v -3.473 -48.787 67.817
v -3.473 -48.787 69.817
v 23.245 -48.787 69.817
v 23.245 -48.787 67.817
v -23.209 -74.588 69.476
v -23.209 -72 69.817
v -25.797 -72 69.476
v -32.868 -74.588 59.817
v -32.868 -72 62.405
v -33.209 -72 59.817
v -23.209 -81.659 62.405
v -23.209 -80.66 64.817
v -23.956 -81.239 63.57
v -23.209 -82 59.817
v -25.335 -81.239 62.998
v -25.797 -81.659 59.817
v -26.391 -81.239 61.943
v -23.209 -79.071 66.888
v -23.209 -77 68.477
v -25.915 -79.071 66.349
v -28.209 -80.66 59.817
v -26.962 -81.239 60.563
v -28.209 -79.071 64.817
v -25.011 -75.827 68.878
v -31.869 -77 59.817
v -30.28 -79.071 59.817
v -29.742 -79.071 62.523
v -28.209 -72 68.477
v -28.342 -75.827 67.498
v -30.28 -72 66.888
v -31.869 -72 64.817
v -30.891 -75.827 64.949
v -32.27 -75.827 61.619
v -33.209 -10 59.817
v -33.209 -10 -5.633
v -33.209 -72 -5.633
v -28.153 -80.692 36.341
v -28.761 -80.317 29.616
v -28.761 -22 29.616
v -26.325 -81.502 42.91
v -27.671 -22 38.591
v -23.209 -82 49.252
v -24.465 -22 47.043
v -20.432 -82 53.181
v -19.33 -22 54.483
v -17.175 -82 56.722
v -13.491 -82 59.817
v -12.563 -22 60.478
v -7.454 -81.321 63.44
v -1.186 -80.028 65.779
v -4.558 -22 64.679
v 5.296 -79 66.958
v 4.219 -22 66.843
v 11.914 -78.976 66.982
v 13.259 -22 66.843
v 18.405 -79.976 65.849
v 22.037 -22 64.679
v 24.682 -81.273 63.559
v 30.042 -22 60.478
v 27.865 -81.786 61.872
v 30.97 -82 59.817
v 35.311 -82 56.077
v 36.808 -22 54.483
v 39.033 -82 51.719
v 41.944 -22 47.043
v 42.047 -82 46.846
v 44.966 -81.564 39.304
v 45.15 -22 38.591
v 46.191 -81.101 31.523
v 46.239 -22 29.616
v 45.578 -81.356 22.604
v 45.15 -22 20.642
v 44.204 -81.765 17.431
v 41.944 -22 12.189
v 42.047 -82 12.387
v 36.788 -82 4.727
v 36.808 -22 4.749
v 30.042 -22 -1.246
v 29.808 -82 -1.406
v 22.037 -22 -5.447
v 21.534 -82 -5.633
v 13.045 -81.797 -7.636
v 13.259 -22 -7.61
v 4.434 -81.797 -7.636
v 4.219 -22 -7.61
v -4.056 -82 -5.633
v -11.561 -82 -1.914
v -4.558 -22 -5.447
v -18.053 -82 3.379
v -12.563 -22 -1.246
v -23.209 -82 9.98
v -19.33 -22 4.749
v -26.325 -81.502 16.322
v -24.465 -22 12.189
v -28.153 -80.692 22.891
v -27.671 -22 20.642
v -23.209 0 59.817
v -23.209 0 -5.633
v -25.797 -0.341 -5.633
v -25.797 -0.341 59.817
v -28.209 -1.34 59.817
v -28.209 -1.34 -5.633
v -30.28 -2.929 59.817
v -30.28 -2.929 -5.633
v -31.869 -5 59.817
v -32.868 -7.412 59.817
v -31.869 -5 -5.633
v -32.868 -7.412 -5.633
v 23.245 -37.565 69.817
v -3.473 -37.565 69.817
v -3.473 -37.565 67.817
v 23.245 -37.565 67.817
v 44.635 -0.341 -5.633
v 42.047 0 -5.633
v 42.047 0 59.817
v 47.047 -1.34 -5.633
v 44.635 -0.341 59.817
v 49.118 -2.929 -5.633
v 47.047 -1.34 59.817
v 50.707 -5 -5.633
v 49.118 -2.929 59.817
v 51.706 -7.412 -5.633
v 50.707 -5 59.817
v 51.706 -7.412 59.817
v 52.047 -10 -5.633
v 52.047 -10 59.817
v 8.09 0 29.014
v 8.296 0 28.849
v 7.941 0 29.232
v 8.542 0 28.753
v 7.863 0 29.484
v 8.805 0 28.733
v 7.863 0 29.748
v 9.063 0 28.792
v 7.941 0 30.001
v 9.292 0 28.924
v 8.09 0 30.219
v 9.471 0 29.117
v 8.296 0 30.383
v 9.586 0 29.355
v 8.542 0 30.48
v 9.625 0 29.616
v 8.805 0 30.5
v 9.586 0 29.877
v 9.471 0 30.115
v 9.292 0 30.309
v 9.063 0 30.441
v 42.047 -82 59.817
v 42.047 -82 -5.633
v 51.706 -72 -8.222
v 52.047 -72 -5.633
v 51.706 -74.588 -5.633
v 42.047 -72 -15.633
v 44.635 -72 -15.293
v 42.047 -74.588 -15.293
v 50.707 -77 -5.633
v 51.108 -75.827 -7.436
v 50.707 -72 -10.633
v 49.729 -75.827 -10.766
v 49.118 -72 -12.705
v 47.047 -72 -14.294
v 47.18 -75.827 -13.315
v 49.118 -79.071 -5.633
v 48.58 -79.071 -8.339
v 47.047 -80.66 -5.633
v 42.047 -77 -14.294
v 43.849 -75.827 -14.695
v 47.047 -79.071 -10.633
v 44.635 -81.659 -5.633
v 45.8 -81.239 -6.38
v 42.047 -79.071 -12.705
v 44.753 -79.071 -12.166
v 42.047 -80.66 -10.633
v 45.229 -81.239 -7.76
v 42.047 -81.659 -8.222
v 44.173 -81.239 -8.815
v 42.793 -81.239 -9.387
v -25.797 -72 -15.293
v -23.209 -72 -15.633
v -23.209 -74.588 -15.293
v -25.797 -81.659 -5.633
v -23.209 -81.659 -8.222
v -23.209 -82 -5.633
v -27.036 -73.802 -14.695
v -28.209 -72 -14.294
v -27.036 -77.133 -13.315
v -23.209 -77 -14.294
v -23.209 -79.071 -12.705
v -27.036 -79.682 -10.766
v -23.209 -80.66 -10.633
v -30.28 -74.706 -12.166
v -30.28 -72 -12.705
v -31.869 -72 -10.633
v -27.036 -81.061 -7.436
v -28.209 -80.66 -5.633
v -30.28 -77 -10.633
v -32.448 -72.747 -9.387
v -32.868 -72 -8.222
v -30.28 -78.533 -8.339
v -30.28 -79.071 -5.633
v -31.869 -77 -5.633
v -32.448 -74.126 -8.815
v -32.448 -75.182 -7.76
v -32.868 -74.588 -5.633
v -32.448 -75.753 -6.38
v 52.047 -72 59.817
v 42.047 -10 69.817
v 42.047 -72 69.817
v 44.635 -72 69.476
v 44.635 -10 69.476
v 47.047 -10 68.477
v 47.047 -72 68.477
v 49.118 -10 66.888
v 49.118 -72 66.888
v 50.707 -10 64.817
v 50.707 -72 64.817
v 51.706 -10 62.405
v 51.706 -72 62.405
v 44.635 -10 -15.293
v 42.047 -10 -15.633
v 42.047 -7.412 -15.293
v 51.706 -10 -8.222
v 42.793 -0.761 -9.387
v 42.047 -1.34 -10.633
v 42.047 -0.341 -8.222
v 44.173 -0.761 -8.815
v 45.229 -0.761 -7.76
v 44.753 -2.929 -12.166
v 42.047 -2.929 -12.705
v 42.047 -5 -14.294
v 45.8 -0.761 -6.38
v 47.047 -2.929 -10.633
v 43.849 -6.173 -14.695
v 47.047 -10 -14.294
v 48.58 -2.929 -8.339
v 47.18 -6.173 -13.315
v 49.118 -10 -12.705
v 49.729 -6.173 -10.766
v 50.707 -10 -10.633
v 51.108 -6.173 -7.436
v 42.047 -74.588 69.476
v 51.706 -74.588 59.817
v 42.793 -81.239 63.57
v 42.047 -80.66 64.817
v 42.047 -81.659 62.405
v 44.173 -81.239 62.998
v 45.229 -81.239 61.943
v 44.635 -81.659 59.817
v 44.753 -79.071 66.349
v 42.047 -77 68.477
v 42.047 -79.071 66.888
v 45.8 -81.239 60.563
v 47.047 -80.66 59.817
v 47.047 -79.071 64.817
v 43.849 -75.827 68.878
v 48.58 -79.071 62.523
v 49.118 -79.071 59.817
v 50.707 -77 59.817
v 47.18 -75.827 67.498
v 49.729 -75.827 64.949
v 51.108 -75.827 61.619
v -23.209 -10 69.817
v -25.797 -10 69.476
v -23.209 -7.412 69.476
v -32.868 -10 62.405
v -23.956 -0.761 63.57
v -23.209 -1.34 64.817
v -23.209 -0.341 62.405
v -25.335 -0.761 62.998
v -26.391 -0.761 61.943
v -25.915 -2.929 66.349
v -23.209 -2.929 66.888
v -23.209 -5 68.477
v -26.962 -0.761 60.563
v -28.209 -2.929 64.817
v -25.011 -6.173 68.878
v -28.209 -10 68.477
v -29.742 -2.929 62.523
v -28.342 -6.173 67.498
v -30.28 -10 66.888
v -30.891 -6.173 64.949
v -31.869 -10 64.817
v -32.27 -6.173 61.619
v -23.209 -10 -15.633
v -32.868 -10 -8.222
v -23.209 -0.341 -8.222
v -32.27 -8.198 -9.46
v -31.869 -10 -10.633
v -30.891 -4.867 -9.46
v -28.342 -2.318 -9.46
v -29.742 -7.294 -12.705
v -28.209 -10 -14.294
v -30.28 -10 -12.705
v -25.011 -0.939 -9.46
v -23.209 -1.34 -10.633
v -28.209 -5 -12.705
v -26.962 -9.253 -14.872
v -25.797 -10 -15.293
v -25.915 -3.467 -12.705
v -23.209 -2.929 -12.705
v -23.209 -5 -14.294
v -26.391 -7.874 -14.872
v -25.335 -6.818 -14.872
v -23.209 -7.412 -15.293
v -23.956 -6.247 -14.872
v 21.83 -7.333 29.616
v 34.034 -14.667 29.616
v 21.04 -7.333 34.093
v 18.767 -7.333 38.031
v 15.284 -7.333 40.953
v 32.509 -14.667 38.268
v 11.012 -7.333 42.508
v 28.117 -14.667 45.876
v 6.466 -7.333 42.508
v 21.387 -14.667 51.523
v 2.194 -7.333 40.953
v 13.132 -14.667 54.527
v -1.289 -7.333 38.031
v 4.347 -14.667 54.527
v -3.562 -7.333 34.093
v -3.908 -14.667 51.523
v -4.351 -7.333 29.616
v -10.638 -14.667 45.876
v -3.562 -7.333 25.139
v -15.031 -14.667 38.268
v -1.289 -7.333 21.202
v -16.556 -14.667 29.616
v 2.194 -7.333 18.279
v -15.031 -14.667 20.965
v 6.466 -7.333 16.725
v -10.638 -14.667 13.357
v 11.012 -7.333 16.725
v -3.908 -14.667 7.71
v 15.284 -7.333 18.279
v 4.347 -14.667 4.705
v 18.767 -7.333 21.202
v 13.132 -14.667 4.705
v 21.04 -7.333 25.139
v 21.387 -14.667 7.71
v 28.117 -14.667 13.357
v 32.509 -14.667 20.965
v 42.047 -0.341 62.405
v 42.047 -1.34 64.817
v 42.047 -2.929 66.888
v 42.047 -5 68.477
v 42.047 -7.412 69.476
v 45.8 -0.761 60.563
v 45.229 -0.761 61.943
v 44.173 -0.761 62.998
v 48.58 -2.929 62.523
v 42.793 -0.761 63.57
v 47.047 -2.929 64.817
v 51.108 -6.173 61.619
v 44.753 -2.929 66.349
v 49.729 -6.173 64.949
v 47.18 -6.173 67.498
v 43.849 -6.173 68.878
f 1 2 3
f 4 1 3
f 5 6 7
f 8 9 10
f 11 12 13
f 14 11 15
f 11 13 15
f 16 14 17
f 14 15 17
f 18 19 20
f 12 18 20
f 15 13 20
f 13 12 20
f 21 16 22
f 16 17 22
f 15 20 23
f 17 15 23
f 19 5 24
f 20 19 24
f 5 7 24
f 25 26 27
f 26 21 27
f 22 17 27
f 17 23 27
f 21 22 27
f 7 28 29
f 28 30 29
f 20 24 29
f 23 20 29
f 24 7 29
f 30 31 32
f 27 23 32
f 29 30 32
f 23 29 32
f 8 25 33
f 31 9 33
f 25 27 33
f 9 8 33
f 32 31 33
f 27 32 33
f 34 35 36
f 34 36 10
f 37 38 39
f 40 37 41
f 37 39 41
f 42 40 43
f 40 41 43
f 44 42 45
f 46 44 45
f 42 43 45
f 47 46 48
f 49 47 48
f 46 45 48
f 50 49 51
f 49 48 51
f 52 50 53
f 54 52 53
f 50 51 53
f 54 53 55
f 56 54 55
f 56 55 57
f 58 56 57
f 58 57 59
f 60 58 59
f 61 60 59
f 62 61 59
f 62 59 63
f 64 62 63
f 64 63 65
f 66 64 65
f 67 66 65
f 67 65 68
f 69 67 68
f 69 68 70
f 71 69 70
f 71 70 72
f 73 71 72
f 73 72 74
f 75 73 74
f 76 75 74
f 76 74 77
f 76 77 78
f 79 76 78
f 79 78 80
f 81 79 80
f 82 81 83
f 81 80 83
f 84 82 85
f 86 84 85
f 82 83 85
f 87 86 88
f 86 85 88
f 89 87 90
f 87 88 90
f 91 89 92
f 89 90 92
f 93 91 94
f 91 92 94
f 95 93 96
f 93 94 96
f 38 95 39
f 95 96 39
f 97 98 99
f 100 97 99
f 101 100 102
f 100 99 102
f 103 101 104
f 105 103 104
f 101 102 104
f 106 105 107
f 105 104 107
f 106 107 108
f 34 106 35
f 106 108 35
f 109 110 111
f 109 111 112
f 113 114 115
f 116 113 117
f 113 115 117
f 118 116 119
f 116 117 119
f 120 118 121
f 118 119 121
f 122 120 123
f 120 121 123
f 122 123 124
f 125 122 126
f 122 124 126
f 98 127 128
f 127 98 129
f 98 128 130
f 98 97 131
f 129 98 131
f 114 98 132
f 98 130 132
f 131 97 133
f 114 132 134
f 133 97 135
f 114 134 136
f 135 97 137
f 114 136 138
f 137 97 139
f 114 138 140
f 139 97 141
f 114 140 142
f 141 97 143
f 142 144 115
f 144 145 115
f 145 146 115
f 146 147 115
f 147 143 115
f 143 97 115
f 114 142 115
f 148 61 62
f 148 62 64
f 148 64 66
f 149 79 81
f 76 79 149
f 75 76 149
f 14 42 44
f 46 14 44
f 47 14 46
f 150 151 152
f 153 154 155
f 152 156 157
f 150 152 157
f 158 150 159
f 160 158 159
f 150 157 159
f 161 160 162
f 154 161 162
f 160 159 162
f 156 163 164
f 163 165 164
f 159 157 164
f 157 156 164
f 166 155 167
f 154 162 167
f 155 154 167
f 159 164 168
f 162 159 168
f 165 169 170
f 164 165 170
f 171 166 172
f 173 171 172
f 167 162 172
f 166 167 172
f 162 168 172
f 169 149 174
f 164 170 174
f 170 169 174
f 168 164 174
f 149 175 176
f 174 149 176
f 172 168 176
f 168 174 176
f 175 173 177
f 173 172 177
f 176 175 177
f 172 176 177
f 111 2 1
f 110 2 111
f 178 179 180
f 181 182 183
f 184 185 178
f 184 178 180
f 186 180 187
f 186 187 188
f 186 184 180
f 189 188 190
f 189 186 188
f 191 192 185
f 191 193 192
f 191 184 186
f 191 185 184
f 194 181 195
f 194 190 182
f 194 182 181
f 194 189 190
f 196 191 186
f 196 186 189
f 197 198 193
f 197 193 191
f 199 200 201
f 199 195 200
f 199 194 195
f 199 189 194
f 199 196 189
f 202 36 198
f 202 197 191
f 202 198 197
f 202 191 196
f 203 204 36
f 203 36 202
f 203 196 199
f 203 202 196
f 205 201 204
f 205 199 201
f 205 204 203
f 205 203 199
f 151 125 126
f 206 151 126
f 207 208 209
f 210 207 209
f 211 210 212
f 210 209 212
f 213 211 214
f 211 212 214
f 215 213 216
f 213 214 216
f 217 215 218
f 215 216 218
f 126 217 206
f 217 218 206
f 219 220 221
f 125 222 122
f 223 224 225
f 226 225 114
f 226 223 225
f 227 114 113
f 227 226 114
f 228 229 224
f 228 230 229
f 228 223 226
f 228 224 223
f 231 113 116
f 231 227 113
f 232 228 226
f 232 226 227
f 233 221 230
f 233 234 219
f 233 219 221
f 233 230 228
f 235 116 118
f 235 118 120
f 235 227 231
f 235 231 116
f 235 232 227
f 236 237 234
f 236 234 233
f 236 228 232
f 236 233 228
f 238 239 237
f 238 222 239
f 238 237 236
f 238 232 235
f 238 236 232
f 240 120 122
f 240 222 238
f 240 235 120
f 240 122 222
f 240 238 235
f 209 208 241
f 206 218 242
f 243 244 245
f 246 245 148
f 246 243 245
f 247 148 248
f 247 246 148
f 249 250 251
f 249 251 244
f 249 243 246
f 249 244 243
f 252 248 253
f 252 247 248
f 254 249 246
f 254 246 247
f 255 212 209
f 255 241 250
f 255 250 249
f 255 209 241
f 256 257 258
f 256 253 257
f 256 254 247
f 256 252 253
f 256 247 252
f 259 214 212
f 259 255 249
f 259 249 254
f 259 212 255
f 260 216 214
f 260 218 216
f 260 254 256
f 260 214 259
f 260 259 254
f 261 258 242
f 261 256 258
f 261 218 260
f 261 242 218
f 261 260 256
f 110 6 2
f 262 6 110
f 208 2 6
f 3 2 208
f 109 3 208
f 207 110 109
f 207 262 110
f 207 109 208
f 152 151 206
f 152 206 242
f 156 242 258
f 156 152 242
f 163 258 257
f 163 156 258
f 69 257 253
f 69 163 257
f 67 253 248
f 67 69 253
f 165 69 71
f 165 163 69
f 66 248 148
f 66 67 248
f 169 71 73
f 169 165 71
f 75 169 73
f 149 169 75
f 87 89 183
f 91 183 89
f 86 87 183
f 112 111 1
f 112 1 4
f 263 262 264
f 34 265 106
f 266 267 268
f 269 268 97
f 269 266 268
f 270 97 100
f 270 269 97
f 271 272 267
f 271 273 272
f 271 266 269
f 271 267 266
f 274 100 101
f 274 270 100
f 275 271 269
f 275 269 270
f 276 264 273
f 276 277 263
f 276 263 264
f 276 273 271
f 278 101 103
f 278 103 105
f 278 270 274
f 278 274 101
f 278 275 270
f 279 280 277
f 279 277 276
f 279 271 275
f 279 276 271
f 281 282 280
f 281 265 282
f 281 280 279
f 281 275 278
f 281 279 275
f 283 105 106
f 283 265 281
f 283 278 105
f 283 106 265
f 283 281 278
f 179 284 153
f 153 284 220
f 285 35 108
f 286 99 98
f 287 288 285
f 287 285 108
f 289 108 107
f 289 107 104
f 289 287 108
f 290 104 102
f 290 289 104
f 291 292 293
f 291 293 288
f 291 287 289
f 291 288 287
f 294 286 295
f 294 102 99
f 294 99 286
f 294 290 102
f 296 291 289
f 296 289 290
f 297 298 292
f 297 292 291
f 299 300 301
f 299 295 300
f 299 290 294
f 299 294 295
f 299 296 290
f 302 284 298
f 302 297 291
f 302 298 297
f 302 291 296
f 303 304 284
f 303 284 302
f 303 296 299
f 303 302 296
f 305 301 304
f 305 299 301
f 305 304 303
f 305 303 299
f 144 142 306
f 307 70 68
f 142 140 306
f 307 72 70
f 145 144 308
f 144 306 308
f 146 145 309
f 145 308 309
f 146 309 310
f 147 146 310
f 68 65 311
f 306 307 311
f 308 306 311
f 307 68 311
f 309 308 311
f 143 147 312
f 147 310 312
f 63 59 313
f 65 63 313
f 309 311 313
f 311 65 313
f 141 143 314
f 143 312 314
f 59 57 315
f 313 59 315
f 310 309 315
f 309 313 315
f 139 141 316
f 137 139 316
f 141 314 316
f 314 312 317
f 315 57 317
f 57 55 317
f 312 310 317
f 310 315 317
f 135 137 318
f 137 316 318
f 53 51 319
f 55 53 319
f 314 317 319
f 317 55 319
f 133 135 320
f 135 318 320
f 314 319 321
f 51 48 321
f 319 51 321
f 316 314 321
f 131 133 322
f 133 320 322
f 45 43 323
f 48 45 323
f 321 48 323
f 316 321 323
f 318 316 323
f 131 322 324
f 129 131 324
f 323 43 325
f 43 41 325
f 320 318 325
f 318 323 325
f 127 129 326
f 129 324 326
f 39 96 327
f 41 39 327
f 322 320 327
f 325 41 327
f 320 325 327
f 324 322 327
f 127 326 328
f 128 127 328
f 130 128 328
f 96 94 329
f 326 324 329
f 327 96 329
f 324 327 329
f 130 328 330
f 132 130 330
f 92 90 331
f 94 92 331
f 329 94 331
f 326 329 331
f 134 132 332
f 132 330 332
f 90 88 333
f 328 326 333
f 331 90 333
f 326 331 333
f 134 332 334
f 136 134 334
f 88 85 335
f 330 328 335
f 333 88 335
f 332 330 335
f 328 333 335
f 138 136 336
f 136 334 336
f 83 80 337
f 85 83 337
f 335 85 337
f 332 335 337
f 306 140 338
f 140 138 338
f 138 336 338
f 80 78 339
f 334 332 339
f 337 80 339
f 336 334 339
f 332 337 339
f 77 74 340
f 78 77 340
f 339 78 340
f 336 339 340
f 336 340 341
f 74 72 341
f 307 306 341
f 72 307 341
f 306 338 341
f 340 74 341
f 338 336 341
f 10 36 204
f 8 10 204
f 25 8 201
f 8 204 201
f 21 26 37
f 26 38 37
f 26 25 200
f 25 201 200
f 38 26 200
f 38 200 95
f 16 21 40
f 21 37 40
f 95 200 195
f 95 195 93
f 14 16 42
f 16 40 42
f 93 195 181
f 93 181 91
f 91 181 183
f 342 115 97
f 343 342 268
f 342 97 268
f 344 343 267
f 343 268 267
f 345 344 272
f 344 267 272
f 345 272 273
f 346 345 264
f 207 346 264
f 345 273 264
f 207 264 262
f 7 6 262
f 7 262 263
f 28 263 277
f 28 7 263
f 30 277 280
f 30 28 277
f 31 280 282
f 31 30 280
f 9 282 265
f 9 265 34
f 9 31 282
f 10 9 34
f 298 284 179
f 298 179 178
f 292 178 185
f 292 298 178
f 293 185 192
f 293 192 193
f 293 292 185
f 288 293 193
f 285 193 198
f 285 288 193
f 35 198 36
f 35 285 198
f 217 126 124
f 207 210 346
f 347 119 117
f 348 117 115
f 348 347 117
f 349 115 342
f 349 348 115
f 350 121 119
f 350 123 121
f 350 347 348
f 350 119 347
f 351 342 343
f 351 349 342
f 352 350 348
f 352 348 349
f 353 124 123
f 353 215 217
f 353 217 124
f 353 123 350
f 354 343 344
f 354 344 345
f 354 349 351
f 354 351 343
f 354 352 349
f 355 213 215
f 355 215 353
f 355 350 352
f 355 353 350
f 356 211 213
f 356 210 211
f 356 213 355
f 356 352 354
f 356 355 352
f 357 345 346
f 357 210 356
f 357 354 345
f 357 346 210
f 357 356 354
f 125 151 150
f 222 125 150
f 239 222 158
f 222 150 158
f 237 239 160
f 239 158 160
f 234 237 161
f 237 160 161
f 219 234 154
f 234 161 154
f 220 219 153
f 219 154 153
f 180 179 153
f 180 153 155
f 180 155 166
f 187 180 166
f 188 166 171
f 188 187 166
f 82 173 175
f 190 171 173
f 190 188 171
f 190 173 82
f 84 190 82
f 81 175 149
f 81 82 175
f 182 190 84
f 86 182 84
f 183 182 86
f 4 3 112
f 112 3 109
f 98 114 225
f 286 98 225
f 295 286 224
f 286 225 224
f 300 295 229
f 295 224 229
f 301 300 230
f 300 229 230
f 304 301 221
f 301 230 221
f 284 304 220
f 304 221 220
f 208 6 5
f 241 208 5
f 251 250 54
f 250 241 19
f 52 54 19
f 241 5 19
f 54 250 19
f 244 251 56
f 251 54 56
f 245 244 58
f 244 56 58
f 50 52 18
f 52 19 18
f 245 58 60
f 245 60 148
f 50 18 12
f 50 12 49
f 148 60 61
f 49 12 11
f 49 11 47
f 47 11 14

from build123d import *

# Parameters (mm, degrees)
F0_W         = 85.2558612823
F0_H         = 85.4500681162
F1_DEPTH     = 82
F3_D         = 75
F3_DEPTH     = 60
F3_TIP       = 22.5322732135
F4_R         = 10
F5_R         = 10
F6_R         = 10
F7_R         = 10
F8_T1_DEPTH  = 62
F8_T3_DEPTH  = 65.2558612823
F8_T5_DEPTH  = 65.4500681162
F8_S9_W      = 10
F8_S9_H      = 10
F8_T10_DEPTH = 10
F8_S15_W     = 10
F8_S15_H     = 10
F8_T16_DEPTH = 10
F8_T20_ANGLE = 90
F8_T22_ANGLE = 90
F8_T24_ANGLE = 90
F9_W         = 26.7179913353
F9_H         = 11.2215578556
F10_DEPTH    = 2


# Not quite as in the source:
# - a fillet or chamfer that OpenCascade refuses, or shapes differently, is made with other operations: its cross-section is extruded or revolved along the edge and cut away or added


with BuildPart() as f1:
    # F0 (on Front) → F1 (new body)
    with BuildSketch(Plane.XZ):
        with Locations((9.4189271331, 27.0915552974)):
            Rectangle(F0_W, F0_H)
    extrude(amount=F1_DEPTH)

    # F3
    with Locations(Plane.XZ.offset(82)):
        with Locations((8.7392125279, 29.616214335)):
            Hole(F3_D / 2, depth=F3_DEPTH)
            with Locations((0, 0, -(F3_DEPTH + F3_TIP / 2))):  # 118° drill point
                Cone(0, F3_D / 2, F3_TIP, mode=Mode.SUBTRACT)

    # F4
    f4_edges = [f1.edges().sort_by_distance(p)[0] for p in [
        (52.046858, -41, 69.816589),
    ]]
    fillet(f4_edges, radius=F4_R)

    # F5
    f5_edges = [f1.edges().sort_by_distance(p)[0] for p in [
        (-33.209004, -41, 69.816589),
    ]]
    fillet(f5_edges, radius=F5_R)

    # F6
    f6_edges = [f1.edges().sort_by_distance(p)[0] for p in [
        (52.046858, -41, -15.633479),
    ]]
    fillet(f6_edges, radius=F6_R)

    # F7
    f7_edges = [f1.edges().sort_by_distance(p)[0] for p in [
        (4.418927, 0, -15.633479),
    ]]
    fillet(f7_edges, radius=F7_R)

    # F8: fillet of radius 10 on 2 edges, made by hand

    # F8_s2 → F8_t1 (cut)
    with BuildSketch(Plane.XZ.offset(10)):
        with BuildLine():
            ThreePointArc((-23.2090035081, -15.6334787607), (-30.28007132, -12.7045465726), (-33.2090035081, -5.6334787607))
            Line((-33.2090035081, -5.6334787607), (-33.2090035081, -15.6334787607))
            Line((-33.2090035081, -15.6334787607), (-23.2090035081, -15.6334787607))
        make_face()
    extrude(amount=F8_T1_DEPTH, mode=Mode.SUBTRACT)

    # F8_s4 → F8_t3 (cut)
    with BuildSketch(Plane.YZ.offset(-23.2090035081)):
        with BuildLine():
            ThreePointArc((-72, 69.8165893555), (-79.0710678119, 66.8876571673), (-82, 59.8165893555))
            Line((-82, 59.8165893555), (-82, 69.8165893555))
            Line((-82, 69.8165893555), (-72, 69.8165893555))
        make_face()
        with BuildLine():
            ThreePointArc((-72, -15.6334787607), (-79.0710678119, -12.7045465726), (-82, -5.6334787607))
            Line((-82, -5.6334787607), (-82, -15.6334787607))
            Line((-82, -15.6334787607), (-72, -15.6334787607))
        make_face()
    extrude(amount=F8_T3_DEPTH, mode=Mode.SUBTRACT)

    # F8_s6 → F8_t5 (cut)
    with BuildSketch(Plane.XY.offset(-5.6334787607)):
        with BuildLine():
            ThreePointArc((-33.2090035081, -72), (-30.28007132, -79.0710678119), (-23.2090035081, -82))
            Line((-23.2090035081, -82), (-33.2090035081, -82))
            Line((-33.2090035081, -82), (-33.2090035081, -72))
        make_face()
        with BuildLine():
            ThreePointArc((52.0468577743, -72), (49.1179255861, -79.0710678119), (42.0468577743, -82))
            Line((42.0468577743, -82), (52.0468577743, -82))
            Line((52.0468577743, -82), (52.0468577743, -72))
        make_face()
    extrude(amount=F8_T5_DEPTH, mode=Mode.SUBTRACT)


with BuildPart() as f8_tool8:
    # F8_s9 → F8_t10 (new body)
    with BuildSketch(Plane.XY.offset(-5.6334787607)):
        with Locations((-28.2090035081, -5)):
            Rectangle(F8_S9_W, F8_S9_H)
    extrude(amount=-F8_T10_DEPTH)

    # F8_s11 → F8_t12 (revolve, cut)
    with BuildSketch(Plane(origin=(-23.2090035081, -10, -5.6334787607), x_dir=(0.7071067812, -0.7071067812, 0), z_dir=(0.7071067812, 0.7071067812, 0))):
        with BuildLine():
            ThreePointArc((0, -10), (10, 0), (0, 10))
            Line((0, 10), (0, -10))
        make_face()
    revolve(axis=Axis((-23.2090035081, -10, -5.6334787607), (0, 0, -1)), mode=Mode.SUBTRACT)


with BuildPart() as f1_1:
    add(f1.part)

    # F8_t7: cut F8_tool8
    add(f8_tool8.part, mode=Mode.SUBTRACT)


with BuildPart() as f8_tool14:
    # F8_s15 → F8_t16 (new body)
    with BuildSketch(Plane.YZ.offset(-23.2090035081)):
        with Locations((-77, -10.6334787607)):
            Rectangle(F8_S15_W, F8_S15_H)
    extrude(amount=-F8_T16_DEPTH)

    # F8_s17 → F8_t18 (revolve, cut)
    with BuildSketch(Plane(origin=(-23.2090035081, -72, -5.6334787607), x_dir=(0, 0.7071067812, 0.7071067812), z_dir=(0, -0.7071067812, 0.7071067812))):
        with BuildLine():
            ThreePointArc((0, -10), (10, 0), (0, 10))
            Line((0, 10), (0, -10))
        make_face()
    revolve(axis=Axis((-23.2090035081, -72, -5.6334787607), (-1, 0, 0)), mode=Mode.SUBTRACT)


with BuildPart() as f1_2:
    add(f1_1.part)

    # F8_t13: cut F8_tool14
    add(f8_tool14.part, mode=Mode.SUBTRACT)

    # F8_s19 → F8_t20 (revolve, cut)
    with BuildSketch(Plane.YZ.offset(42.0468577743)):
        with BuildLine():
            ThreePointArc((-82, 59.8165893555), (-79.0710678119, 66.8876571673), (-72, 69.8165893555))
            Line((-72, 69.8165893555), (-82, 69.8165893555))
            Line((-82, 69.8165893555), (-82, 59.8165893555))
        make_face()
    revolve(axis=Axis((42.0468577743, -82, 59.8165893555), (0, 1, 0)), revolution_arc=F8_T20_ANGLE, mode=Mode.SUBTRACT)

    # F8_s21 → F8_t22 (revolve, cut)
    with BuildSketch(Plane.YZ.offset(-23.2090035081)):
        with BuildLine():
            ThreePointArc((-82, 59.8165893555), (-79.0710678119, 66.8876571673), (-72, 69.8165893555))
            Line((-72, 69.8165893555), (-82, 69.8165893555))
            Line((-82, 69.8165893555), (-82, 59.8165893555))
        make_face()
    revolve(axis=Axis((-23.2090035081, -82, 59.8165893555), (0, -1, 0)), revolution_arc=F8_T22_ANGLE, mode=Mode.SUBTRACT)

    # F8_s23 → F8_t24 (revolve, cut)
    with BuildSketch(Plane.XY.offset(-5.6334787607)):
        with BuildLine():
            ThreePointArc((52.0468577743, -72), (49.1179255861, -79.0710678119), (42.0468577743, -82))
            Line((42.0468577743, -82), (52.0468577743, -82))
            Line((52.0468577743, -82), (52.0468577743, -72))
        make_face()
    revolve(axis=Axis((42.0468577743, -82, -5.6334787607), (0, 1, 0)), revolution_arc=F8_T24_ANGLE, mode=Mode.SUBTRACT)

    # F9 (on face) → F10 (cut)
    with BuildSketch(Plane.XY.offset(69.8165893555)):
        with Locations((9.8856553668, -43.1762188673)):
            Rectangle(F9_W, F9_H)
    extrude(amount=-F10_DEPTH, mode=Mode.SUBTRACT)


solid = f1_2.part
